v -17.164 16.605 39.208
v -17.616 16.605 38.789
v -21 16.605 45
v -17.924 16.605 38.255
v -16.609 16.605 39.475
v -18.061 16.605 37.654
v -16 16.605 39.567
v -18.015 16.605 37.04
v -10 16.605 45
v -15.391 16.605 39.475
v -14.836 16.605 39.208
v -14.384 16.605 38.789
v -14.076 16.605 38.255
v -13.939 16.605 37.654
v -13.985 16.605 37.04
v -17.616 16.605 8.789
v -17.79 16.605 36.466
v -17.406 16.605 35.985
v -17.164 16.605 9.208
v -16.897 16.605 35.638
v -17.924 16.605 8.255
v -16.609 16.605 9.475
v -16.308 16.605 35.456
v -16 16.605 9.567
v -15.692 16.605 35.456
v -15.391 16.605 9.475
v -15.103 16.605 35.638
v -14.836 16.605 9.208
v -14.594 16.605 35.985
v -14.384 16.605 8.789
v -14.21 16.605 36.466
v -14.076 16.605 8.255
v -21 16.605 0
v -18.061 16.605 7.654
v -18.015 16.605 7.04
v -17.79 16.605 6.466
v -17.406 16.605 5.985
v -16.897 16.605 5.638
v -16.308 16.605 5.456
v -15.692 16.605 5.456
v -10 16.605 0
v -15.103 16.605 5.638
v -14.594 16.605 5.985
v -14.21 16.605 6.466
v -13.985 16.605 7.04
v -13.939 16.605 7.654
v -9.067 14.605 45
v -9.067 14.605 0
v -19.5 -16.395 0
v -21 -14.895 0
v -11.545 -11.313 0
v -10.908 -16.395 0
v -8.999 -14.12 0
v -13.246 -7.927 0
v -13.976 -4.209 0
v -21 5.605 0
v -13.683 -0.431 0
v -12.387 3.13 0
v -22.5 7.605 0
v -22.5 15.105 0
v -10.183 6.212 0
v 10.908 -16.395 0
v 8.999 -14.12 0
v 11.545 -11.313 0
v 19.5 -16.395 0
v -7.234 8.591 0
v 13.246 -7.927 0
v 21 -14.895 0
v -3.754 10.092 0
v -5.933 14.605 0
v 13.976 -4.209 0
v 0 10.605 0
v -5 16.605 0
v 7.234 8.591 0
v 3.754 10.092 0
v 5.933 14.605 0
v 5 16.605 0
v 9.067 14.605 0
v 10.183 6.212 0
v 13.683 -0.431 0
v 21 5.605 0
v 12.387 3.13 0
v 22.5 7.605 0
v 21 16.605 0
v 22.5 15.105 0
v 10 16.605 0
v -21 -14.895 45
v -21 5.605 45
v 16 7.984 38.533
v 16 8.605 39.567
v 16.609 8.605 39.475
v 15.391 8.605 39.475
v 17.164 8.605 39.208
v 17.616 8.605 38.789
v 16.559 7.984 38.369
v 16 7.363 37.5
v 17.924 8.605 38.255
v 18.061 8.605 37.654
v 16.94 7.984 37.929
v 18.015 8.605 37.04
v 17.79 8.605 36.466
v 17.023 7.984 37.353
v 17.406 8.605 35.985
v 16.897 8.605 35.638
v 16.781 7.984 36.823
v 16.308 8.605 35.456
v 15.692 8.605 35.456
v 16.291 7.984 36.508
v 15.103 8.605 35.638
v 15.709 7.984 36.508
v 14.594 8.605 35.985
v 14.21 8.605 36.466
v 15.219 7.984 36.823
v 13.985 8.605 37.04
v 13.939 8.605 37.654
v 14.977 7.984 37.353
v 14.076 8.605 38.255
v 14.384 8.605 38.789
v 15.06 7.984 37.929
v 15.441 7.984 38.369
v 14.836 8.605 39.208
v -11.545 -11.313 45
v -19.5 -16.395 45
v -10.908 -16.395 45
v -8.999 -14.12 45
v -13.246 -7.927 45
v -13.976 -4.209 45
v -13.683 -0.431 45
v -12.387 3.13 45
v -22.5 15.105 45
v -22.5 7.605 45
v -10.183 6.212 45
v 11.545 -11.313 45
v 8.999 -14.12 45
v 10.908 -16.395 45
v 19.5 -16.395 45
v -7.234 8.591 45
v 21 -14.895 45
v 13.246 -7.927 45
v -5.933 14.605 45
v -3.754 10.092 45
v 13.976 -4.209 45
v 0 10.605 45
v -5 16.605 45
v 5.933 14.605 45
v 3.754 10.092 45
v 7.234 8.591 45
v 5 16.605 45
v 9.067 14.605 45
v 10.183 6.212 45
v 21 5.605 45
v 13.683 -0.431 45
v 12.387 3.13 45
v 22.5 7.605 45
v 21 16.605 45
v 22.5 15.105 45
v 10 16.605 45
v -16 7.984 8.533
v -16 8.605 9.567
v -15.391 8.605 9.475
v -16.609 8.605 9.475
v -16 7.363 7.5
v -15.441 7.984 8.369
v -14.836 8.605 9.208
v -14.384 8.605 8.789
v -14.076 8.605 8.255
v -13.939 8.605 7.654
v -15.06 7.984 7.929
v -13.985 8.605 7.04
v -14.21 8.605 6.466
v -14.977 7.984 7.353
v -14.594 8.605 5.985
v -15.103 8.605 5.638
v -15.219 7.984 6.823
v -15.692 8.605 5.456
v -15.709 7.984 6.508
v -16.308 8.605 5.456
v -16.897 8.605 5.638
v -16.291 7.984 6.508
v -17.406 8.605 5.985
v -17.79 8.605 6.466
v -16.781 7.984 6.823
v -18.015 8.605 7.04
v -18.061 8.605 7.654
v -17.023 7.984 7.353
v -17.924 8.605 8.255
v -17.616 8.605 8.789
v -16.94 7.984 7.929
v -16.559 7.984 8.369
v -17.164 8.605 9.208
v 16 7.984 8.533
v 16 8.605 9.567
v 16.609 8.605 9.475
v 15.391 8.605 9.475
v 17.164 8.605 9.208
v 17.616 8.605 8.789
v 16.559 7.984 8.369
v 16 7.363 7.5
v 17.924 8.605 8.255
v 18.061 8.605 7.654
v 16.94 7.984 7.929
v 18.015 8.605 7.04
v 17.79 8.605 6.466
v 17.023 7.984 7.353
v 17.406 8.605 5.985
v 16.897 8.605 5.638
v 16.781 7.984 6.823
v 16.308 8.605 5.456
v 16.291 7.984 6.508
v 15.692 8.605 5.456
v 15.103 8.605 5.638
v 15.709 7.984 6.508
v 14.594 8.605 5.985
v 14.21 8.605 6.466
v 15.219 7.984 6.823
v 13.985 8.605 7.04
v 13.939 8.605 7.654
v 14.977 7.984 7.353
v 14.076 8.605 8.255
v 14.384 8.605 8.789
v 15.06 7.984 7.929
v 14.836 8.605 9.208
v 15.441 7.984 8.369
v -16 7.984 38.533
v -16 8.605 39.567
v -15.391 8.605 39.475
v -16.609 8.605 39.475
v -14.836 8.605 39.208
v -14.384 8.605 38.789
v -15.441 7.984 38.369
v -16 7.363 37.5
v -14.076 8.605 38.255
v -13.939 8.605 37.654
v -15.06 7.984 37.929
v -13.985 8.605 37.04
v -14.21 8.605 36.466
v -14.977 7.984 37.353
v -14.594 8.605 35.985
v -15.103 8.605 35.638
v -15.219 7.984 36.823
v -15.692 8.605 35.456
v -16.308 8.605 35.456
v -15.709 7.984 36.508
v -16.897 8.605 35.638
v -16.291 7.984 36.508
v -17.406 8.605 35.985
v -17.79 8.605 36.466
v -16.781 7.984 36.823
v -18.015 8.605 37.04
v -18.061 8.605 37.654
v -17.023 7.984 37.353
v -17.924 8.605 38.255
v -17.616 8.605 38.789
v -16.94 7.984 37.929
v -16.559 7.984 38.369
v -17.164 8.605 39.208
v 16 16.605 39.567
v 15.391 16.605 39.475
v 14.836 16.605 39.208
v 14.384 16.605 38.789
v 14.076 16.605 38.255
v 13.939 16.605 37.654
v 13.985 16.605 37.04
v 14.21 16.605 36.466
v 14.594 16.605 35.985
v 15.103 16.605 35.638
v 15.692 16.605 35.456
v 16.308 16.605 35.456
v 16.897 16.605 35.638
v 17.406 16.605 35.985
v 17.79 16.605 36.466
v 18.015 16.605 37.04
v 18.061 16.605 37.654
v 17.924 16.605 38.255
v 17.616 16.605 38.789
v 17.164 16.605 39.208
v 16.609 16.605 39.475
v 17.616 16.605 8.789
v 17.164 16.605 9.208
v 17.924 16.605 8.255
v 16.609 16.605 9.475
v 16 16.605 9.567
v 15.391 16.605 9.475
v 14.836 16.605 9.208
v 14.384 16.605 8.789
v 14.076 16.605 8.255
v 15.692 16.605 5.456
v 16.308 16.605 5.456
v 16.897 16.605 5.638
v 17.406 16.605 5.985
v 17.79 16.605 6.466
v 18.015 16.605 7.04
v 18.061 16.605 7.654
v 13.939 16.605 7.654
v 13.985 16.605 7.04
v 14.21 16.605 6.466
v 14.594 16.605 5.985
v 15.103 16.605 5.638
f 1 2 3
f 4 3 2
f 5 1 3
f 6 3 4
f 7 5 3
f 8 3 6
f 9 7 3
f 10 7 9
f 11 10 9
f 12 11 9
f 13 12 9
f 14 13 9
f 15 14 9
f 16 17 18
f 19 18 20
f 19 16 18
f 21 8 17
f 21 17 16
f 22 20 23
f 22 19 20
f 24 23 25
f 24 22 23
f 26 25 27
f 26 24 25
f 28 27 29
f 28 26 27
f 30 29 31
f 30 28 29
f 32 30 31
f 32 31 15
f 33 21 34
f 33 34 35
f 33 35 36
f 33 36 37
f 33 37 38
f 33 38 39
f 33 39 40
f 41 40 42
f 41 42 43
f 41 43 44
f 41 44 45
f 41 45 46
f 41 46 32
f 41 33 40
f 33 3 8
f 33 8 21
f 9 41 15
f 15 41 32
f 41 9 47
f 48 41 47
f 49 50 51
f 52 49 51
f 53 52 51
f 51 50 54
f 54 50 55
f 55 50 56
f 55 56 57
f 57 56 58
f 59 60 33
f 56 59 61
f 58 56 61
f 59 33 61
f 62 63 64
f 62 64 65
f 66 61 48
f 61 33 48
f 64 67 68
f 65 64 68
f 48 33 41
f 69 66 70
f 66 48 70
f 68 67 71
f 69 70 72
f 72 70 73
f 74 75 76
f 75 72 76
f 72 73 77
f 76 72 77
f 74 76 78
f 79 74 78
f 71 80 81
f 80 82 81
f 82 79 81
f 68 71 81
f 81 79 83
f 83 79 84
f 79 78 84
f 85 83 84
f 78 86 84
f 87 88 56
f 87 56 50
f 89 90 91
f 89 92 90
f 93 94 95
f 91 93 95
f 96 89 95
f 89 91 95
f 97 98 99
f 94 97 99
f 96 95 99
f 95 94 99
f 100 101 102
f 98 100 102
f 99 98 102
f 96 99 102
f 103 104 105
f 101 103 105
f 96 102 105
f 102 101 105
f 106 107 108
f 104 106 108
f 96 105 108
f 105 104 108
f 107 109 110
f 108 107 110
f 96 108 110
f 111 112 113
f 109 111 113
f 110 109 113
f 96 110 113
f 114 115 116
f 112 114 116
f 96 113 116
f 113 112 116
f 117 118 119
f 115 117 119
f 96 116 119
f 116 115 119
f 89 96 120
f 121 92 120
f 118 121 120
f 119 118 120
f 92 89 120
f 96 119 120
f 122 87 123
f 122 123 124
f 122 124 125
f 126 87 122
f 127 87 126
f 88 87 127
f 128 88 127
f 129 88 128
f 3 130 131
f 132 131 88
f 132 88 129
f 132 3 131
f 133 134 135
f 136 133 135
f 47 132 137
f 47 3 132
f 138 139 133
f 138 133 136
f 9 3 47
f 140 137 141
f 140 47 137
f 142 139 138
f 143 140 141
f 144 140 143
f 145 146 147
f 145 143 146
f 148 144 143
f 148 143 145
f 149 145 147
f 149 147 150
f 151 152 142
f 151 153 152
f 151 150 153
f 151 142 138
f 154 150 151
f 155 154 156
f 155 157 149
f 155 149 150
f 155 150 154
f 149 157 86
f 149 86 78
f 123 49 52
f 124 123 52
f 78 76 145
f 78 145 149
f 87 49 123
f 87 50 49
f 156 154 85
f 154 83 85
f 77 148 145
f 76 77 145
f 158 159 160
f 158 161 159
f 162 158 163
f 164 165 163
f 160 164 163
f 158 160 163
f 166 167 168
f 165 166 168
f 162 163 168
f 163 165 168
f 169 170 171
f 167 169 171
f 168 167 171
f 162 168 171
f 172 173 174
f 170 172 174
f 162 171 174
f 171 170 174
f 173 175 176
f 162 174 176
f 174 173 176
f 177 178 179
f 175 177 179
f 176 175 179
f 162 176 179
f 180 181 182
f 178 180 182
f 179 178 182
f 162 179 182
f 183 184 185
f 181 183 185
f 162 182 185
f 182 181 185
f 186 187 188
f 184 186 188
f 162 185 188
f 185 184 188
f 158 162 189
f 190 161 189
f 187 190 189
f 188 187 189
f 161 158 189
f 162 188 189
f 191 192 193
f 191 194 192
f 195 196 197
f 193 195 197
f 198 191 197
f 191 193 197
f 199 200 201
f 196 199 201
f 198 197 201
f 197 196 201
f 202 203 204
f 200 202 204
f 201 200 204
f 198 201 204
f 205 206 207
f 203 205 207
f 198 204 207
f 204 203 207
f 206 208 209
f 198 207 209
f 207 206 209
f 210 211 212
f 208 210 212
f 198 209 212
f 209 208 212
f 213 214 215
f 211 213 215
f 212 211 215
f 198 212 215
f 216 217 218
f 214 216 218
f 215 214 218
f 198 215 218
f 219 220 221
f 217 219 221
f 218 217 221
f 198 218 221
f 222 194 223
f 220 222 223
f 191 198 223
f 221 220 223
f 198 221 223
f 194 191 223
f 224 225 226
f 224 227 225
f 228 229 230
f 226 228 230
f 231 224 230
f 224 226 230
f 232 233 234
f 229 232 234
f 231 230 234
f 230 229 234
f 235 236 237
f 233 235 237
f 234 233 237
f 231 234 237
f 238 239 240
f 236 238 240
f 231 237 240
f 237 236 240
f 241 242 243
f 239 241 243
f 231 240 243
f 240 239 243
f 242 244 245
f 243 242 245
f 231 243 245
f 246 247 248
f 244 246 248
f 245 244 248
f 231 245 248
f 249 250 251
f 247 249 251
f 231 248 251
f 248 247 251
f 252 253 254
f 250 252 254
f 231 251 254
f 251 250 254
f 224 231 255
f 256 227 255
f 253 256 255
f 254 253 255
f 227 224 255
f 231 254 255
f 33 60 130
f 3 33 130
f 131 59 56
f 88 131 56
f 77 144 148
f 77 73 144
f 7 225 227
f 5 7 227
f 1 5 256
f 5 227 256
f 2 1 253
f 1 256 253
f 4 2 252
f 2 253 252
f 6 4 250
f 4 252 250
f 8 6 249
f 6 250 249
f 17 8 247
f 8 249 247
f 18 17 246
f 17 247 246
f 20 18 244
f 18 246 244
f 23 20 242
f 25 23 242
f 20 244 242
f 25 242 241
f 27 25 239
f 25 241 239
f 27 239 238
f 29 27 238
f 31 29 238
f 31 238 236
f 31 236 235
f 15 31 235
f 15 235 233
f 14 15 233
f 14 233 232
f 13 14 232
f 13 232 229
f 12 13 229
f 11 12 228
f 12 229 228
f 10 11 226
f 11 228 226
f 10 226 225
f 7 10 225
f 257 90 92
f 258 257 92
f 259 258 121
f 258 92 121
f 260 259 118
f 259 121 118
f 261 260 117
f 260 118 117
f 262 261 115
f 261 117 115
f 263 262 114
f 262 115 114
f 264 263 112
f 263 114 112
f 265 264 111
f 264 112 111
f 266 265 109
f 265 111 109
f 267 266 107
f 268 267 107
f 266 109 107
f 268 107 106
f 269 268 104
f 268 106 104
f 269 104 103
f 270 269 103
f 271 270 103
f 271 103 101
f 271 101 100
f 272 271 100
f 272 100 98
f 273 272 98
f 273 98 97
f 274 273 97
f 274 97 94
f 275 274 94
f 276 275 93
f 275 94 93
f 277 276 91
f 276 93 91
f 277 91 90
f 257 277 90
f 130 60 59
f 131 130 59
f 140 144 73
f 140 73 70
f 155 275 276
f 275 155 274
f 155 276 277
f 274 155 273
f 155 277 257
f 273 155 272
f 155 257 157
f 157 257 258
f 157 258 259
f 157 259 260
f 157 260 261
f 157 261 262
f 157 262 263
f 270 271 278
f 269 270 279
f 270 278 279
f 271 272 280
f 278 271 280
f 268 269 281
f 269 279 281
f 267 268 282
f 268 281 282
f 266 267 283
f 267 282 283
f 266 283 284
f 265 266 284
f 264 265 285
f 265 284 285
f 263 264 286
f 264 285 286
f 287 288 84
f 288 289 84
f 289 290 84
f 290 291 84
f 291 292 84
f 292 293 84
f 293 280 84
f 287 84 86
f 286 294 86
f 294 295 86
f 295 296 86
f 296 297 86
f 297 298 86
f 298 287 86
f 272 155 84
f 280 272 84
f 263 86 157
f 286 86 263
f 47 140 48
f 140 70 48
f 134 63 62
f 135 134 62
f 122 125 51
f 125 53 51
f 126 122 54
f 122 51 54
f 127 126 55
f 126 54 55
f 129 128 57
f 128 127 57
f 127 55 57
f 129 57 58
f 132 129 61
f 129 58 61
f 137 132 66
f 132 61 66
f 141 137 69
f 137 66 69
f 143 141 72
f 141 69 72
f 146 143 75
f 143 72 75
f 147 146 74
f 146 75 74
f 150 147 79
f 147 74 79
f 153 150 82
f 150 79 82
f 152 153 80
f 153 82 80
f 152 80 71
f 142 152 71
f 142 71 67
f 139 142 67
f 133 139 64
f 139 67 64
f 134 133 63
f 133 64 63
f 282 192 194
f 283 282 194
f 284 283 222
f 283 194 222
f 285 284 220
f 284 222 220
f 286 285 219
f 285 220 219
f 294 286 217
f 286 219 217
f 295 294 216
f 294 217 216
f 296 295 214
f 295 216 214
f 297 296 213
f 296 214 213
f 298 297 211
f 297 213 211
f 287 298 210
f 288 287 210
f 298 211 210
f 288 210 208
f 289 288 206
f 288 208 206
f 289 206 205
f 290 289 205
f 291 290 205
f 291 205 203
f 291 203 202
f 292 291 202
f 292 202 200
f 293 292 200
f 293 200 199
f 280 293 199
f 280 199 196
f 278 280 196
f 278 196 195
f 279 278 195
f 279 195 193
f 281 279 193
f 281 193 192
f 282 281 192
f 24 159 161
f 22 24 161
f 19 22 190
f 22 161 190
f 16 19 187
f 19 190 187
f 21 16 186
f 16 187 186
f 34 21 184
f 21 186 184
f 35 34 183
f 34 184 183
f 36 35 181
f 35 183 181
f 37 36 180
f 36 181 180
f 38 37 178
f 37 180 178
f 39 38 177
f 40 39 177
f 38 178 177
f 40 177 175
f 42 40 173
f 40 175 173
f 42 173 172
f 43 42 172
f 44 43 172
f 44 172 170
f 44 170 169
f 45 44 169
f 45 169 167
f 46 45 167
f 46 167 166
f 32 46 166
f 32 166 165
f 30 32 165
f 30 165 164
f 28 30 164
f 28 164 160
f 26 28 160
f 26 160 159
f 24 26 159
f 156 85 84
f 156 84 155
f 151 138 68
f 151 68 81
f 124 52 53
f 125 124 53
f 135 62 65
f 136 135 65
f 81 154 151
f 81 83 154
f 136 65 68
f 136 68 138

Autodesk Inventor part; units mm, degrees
ref_plane "YZ Plane" through (0, 0, 0) normal (1, 0, 0) x (0, 1, 0)
ref_plane "XZ Plane" through (0, 0, 0) normal (0, 1, 0) x (-1, 0, 0)
ref_plane "XY Plane" through (0, 0, 0) normal (0, 0, 1) x (1, 0, 0)
sketch "Esboço1" plane through (0, 0, 0) normal (0, 0, 1) x (1, 0, 0)
  line L0 (-22.5, 16.605) -> (22.5, 16.605) construction
  line L1 (22.5, 16.605) -> (22.5, -16.395) construction
  line L2 (22.5, -16.395) -> (-22.5, -16.395) construction
  line L3 (-22.5, -16.395) -> (-22.5, 16.605) construction
  line L4 (-14, 20.4248) -> (-14, -25.3484) construction
  line L5 (14, 20.4248) -> (14, -25.3484) construction
  line L6 (0, 20.9223) -> (0, -24.8509) construction
  line L7 (-26.3196, -3.395) -> (26.3196, -3.395) construction
  line L8 (-26.3196, 7.605) -> (26.3196, 7.605) construction
  line L9 (-21, 20.7786) -> (-21, -24.9946) construction
  line L10 (21, 20.4248) -> (21, -25.3484) construction
  line L11 (0, -3.395) -> (-21.4941, -29.0107) construction
  line L12 (0, -3.395) -> (21.8166, -29.395) construction
  line L13 (-10, 20.4248) -> (-10, -25.3484) construction
  line L14 (-5, 20.4248) -> (-5, -25.3484) construction
  line L15 (5, 20.9223) -> (5, -24.8509) construction
  line L16 (10, 20.9223) -> (10, -24.8509) construction
  line L17 (-26.3196, 5.605) -> (26.3196, 5.605) construction
  line L18 (-22.5, 16.605) -> (-22.5, 7.605)
  line L19 (-22.5, 7.605) -> (-21, 5.605)
  line L20 (-21, 5.605) -> (-21, -16.395)
  line L21 (-21, -16.395) -> (-10.9083, -16.395)
  line L22 (-10.9083, -16.395) -> (-8.999, -14.1196)
  line L23 (8.999, -14.1196) -> (10.9083, -16.395)
  line L24 (10.9083, -16.395) -> (21, -16.395)
  line L25 (22.5, 7.605) -> (22.5, 16.605)
  line L26 (26.3196, 14.605) -> (-26.3196, 14.605) construction
  line L27 (-22.5, 16.605) -> (-10, 16.605)
  line L28 (-5, 16.605) -> (5, 16.605)
  line L29 (22.5, 16.605) -> (10, 16.605)
  arc A0 (8.999, -14.1196) -> (-8.999, -14.1196) centre (0, -3.395) ccw
  line L30 (-10, 16.605) -> (-7.6714, 16.605) construction
  line L31 (-10, 16.605) -> (-9.0674, 14.605)
  line L32 (-10, 16.605) -> (-7.7932, 16.605) construction
  line L33 (-5, 16.605) -> (-5.9326, 14.605)
  line L34 (-5, 16.605) -> (-2.7932, 16.605) construction
  line L35 (-5.9326, 14.605) -> (-9.0674, 14.605)
  line L36 (5, 16.605) -> (5.9326, 14.605)
  line L37 (10, 16.605) -> (9.0674, 14.605)
  line L38 (5.9326, 14.605) -> (9.0674, 14.605)
  line L39 (21, -16.395) -> (21, 5.605)
  line L40 (22.5, 7.605) -> (21, 5.605)
  point P0 (0, 0)
  point P1 (0, 16.605)
  point P2 (0, 7.605)
  dimension "largura" = 45
  dimension "altura" = 33
  dimension "d2" = 14
  dimension "d3" = 14
  dimension "d4" = 20
  dimension "d5" = 9
  dimension "d7" = 1.5
  dimension "d8" = 1.5
  dimension "d9" = 40
  dimension "d10" = 40
  dimension "d11" = 5
  dimension "d12" = 5
  dimension "d13" = 10
  dimension "d14" = 10
  dimension "d15" = 2
  dimension "d16" = 2
  dimension "d18" = 14
  dimension "d21" = 115
  dimension "d22" = 115
  dimension "d23" = 115
  dimension "d24" = 115
extrude "Extrusão1" add sketch "Esboço1" along normal blind 45
chamfer "Chanfro1" distance 1.5 angle 45 4 edges at (22.5, 16.605, 22.5) (-22.5, 16.605, 22.5) (21, -16.395, 22.5) (-21, -16.395, 22.5)
sketch "Esboço2" plane through (-10, 16.605, 45) normal (0, 1, 0) x (1, 0, 0)
  line L0 (-12.5, 45) -> (-12.5, 0) construction
  line L1 (-12.5, 22.5) -> (32.5, 22.5) construction
  line L2 (32.5, 45) -> (32.5, 0) construction
  line L3 (10, 45) -> (10, 0) construction
  circle A0 centre (-6, 7.5) radius 1 construction
  circle A1 centre (26, 7.5) radius 1 construction
  circle A2 centre (-6, 37.5) radius 1 construction
  circle A3 centre (26, 37.5) radius 1 construction
  dimension "d31" = 2
  dimension "d32" = 2
  dimension "d33" = 2
  dimension "d34" = 2
  dimension "d35" = 16
  dimension "d36" = 16
  dimension "d37" = 16
  dimension "d38" = 16
  dimension "d39" = 15
  dimension "d40" = 15
  dimension "d41" = 15
  dimension "d42" = 15
hole "Furo1" at (-16, 16.605, 37.5) at (-16, 16.605, 7.5) at (16, 16.605, 7.5) at (16, 16.605, 37.5) direction (0, -1, 0) diameter 4.134 depth 8 tip angle 118 thread size "M5x0.8" class "6H" standard "ANSI Metric M Profile"
equation "\"d3\" = d2"
equation "\"d8\" = d7"
equation "\"d10\" = d9"
equation "\"d12\" = d11"
equation "\"d14\" = d13"
equation "\"d32\" = d31"
equation "\"d33\" = d31"
equation "\"d34\" = d31"
equation "\"d40\" = d39"
equation "\"d41\" = d39"
equation "\"d42\" = d39"
properties part number "PilowBlockAbertoSBR16"
